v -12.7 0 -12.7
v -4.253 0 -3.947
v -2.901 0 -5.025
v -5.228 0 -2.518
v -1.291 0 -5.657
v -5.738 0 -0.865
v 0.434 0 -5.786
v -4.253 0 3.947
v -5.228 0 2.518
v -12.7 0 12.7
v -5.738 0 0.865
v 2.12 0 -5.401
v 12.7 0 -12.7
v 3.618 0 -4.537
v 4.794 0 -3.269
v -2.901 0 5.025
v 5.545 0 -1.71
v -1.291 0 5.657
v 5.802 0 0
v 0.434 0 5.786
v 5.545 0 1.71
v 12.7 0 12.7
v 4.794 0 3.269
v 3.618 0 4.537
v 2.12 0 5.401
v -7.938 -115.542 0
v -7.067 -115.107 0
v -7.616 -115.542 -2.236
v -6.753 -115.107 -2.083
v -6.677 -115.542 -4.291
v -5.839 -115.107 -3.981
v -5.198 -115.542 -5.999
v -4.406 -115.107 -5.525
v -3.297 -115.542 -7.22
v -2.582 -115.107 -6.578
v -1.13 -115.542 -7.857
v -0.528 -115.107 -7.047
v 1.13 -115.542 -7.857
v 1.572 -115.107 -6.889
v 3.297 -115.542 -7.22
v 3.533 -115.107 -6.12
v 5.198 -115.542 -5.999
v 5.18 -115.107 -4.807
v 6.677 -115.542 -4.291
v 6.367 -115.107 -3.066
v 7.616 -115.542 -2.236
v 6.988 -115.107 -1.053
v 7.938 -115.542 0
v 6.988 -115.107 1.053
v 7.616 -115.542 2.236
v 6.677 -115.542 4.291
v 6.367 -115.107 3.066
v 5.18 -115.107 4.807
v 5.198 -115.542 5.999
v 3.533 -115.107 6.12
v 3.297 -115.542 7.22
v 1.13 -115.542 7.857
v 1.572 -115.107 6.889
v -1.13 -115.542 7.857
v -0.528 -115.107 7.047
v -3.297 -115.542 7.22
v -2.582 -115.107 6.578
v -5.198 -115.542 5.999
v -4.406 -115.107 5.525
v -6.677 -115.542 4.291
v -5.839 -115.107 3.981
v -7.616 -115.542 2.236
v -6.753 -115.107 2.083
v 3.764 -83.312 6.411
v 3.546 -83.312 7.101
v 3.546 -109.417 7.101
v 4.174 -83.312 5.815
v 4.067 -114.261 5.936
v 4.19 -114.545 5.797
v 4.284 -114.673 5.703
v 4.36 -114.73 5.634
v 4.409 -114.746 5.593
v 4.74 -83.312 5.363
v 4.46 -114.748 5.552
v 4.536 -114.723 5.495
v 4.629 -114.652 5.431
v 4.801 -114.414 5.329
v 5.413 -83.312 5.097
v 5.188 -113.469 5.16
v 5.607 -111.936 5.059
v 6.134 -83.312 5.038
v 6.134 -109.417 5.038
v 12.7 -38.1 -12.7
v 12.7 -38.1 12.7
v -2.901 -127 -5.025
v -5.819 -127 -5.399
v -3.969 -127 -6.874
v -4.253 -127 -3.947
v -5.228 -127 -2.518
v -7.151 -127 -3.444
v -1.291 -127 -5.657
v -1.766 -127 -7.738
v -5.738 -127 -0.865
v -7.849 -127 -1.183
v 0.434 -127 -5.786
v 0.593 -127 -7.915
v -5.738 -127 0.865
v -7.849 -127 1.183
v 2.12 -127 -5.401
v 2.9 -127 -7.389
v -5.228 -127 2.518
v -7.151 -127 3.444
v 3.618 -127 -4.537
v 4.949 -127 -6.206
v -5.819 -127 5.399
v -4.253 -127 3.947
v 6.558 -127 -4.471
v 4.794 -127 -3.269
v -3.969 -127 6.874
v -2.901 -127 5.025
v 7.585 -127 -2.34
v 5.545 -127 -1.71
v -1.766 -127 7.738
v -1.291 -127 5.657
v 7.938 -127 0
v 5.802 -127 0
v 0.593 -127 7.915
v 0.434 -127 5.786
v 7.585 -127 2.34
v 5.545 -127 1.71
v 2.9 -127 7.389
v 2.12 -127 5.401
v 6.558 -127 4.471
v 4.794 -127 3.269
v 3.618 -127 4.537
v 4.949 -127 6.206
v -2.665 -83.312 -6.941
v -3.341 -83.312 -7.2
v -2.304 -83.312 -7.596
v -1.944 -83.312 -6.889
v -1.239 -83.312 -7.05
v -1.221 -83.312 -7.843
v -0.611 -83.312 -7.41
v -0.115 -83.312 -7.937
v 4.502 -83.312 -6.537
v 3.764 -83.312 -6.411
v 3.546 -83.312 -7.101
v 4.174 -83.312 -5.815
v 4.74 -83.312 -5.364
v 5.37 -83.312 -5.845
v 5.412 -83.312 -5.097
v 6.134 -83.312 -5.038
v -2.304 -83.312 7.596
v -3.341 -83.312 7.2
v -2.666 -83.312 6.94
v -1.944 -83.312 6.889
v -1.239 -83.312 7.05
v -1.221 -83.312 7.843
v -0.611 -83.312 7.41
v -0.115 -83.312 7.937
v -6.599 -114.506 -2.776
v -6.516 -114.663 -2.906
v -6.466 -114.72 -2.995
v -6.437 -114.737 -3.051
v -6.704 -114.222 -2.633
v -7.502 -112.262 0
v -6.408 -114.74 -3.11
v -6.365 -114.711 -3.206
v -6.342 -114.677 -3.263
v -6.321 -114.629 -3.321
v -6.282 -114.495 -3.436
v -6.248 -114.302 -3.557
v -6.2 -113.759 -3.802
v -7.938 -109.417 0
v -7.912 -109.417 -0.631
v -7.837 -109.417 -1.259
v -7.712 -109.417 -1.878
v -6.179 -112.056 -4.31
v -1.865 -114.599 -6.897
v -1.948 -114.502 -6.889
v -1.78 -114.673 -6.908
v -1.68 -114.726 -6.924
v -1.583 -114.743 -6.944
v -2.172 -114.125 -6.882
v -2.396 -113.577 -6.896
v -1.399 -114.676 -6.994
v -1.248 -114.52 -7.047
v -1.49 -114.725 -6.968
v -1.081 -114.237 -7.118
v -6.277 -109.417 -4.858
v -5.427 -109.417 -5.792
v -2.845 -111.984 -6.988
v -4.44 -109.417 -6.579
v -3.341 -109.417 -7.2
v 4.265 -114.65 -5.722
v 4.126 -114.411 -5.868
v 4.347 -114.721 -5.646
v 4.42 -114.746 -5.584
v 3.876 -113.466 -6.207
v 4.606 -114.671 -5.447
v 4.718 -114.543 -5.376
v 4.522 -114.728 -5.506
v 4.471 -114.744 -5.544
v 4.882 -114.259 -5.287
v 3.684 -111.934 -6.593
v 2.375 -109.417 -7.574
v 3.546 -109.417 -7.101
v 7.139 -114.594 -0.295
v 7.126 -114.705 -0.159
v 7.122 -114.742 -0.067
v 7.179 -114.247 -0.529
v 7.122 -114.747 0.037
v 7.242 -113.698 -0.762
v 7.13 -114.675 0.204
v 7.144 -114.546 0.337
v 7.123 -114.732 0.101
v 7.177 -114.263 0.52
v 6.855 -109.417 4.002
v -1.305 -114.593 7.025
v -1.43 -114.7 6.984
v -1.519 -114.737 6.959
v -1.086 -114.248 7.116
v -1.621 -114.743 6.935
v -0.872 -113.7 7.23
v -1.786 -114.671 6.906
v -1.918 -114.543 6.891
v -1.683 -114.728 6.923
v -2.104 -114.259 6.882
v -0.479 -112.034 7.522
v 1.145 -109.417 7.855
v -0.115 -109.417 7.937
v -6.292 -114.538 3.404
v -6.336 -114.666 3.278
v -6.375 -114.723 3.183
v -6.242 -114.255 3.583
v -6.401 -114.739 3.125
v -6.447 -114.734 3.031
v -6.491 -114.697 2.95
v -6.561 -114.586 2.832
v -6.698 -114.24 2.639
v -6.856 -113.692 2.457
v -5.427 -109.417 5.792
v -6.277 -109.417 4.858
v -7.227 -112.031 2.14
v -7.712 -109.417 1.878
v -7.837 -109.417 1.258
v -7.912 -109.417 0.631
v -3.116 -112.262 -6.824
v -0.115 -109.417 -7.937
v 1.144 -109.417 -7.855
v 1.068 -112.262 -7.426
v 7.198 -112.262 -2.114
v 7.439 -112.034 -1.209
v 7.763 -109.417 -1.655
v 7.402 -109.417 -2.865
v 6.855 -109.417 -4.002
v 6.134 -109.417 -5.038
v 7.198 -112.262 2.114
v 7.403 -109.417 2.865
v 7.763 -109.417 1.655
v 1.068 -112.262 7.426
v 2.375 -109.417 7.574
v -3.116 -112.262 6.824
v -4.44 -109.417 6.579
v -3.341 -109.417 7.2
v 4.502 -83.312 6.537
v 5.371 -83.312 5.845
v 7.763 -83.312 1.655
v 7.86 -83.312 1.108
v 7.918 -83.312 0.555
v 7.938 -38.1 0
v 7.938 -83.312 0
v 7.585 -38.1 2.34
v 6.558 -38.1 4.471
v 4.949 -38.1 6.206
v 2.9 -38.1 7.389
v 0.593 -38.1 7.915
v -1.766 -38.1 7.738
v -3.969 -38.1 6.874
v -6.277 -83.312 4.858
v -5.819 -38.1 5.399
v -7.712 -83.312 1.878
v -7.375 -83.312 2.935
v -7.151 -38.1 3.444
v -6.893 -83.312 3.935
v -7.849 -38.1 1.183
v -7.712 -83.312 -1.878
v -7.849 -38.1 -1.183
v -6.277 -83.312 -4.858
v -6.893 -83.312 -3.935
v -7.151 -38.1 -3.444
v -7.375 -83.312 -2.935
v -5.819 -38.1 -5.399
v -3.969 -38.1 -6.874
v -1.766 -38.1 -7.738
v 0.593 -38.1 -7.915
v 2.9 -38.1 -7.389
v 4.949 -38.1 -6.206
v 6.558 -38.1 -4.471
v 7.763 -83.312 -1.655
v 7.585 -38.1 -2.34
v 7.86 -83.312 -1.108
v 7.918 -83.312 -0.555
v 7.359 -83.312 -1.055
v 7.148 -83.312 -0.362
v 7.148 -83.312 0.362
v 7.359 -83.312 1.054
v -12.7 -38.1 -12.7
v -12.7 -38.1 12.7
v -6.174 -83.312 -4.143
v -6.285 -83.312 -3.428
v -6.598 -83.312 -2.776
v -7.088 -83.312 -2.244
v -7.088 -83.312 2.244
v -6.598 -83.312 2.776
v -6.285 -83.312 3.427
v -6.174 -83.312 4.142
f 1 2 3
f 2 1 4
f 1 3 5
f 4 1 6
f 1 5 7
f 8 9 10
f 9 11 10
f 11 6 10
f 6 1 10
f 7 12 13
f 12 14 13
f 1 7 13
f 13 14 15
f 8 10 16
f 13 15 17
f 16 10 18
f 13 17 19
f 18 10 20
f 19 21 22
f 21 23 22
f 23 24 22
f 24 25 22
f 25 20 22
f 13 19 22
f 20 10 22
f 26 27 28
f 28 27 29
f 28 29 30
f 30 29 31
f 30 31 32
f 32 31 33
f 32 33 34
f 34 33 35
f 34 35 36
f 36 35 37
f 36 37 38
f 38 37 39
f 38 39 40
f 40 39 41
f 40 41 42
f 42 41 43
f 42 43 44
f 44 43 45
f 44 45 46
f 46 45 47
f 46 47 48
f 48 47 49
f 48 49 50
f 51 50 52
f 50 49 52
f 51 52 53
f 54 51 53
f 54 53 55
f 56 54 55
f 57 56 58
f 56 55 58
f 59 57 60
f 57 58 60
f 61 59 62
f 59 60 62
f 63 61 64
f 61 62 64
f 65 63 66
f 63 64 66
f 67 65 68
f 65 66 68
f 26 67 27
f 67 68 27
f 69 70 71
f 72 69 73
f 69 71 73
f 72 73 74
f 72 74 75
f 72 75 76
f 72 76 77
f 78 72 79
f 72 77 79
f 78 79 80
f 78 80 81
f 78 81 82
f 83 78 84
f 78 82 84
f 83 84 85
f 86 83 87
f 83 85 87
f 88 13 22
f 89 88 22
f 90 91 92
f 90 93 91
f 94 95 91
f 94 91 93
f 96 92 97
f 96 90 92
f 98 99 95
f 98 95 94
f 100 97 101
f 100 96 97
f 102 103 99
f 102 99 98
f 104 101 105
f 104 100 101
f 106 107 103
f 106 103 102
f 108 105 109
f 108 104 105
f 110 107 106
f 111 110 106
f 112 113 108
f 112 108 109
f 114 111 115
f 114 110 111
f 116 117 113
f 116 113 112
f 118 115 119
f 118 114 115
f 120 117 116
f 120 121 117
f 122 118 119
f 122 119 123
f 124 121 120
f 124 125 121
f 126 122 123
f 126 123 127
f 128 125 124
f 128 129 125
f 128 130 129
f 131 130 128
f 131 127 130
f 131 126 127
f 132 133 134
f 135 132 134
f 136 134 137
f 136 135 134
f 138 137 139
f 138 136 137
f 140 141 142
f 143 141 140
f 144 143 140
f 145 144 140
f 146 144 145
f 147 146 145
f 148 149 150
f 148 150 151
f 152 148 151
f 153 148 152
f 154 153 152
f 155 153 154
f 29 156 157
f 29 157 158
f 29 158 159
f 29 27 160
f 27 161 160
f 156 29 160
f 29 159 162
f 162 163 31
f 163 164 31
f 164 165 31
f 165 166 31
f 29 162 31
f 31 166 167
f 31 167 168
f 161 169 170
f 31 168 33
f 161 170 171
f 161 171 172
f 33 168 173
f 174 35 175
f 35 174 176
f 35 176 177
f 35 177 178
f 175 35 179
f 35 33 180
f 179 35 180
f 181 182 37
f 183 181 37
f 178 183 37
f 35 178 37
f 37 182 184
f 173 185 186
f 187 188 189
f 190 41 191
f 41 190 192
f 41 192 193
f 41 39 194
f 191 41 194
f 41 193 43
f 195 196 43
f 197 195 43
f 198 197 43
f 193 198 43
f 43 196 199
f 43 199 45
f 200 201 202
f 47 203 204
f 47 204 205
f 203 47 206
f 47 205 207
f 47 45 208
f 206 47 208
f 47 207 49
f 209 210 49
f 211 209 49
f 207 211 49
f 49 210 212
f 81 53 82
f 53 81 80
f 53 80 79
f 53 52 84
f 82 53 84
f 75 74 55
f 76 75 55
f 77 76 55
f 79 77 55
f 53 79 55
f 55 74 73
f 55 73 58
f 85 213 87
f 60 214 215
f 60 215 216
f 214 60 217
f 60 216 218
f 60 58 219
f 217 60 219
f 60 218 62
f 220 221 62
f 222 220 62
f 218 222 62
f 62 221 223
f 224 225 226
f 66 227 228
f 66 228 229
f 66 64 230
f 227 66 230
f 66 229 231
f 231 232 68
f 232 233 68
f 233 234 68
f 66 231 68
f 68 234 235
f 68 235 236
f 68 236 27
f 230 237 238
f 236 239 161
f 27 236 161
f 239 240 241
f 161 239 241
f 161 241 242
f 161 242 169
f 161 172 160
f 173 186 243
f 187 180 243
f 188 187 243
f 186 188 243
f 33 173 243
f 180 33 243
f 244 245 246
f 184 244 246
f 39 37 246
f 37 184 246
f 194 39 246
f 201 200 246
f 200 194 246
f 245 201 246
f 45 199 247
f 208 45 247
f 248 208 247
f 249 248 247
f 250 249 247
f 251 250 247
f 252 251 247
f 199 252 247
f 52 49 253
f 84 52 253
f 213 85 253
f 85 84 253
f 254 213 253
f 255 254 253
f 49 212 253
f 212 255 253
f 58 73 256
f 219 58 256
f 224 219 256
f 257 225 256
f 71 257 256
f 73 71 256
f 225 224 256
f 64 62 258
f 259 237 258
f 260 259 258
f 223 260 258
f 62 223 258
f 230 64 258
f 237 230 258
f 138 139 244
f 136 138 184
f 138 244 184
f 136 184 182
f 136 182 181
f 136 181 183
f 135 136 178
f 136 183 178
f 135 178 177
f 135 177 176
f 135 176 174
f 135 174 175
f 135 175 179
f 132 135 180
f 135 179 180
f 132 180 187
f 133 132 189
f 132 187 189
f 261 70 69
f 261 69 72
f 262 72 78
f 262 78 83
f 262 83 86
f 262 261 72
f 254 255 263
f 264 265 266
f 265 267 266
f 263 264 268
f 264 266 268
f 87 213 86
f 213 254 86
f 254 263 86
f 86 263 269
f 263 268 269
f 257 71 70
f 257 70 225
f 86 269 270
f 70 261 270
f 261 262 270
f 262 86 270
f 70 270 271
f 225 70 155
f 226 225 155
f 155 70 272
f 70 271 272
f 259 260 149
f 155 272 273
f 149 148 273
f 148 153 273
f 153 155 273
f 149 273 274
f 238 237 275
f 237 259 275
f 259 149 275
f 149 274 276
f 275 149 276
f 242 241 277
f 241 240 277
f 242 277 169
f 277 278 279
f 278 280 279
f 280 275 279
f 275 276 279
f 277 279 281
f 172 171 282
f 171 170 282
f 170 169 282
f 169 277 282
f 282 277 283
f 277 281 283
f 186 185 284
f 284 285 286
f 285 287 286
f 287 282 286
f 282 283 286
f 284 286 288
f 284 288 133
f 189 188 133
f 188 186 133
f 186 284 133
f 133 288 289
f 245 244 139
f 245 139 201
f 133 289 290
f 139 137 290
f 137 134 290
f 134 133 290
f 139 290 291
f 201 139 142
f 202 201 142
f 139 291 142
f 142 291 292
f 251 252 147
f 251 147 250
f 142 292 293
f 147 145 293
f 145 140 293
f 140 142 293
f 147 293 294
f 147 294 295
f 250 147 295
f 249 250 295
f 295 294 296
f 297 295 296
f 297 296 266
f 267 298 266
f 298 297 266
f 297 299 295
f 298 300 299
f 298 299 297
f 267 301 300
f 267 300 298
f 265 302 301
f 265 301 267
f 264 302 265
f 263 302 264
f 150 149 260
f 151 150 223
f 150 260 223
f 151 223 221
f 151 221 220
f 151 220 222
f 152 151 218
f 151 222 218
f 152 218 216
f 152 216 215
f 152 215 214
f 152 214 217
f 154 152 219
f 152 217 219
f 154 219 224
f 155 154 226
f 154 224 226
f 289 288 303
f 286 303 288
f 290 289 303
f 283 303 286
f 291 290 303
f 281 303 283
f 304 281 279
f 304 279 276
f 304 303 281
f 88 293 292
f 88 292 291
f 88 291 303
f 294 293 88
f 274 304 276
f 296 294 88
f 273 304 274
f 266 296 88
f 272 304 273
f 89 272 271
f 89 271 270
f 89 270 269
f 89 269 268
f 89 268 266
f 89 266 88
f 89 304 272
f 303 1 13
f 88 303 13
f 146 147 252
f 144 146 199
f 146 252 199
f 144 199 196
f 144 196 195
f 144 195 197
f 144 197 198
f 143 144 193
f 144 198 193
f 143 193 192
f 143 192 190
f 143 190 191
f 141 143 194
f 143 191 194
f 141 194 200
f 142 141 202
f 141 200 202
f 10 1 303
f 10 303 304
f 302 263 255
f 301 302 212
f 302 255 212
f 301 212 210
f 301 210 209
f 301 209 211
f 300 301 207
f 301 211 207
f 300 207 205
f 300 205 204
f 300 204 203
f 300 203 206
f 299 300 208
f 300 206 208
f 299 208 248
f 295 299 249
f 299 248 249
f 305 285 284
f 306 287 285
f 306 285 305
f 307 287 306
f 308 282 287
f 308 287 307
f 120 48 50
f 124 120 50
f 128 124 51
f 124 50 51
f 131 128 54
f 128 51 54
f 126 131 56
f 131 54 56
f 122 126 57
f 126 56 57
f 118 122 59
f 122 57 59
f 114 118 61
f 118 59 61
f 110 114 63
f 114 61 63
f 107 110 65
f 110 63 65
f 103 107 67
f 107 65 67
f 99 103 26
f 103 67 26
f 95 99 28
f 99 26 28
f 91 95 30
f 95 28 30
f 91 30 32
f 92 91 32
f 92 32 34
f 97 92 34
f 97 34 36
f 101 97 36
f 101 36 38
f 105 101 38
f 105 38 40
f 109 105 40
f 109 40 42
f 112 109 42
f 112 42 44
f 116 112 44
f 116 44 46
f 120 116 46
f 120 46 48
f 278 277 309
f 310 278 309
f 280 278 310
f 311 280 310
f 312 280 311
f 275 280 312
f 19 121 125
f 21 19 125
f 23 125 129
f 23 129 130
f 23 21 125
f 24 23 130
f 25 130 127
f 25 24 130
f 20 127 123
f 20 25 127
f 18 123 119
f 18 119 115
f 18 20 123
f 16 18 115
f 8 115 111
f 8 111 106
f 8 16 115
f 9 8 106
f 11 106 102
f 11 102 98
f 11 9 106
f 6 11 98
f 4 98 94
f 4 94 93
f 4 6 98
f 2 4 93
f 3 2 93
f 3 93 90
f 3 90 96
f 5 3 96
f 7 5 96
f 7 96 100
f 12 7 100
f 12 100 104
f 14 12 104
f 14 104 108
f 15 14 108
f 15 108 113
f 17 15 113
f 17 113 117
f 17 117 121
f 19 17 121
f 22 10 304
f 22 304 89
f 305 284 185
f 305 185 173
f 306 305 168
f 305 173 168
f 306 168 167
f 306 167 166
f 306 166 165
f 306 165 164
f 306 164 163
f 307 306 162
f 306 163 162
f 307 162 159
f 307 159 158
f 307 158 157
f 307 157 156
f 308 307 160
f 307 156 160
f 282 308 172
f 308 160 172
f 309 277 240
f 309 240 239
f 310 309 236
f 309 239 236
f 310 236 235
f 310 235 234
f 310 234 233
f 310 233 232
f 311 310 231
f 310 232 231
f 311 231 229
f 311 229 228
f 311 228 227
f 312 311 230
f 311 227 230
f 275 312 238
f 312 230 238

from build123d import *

# Parameters (mm, degrees)
F0_W     = 25.4
F0_H     = 25.4
F0_R     = 7.9375
F0_R_2   = 5.8024107256
F1_DEPTH = 38.1
F2_DEPTH = 127
F6_START = -12.192
F5_R     = 2.4554456834
F6_DEPTH = 31.496


with BuildPart() as f1:
    # F0 (on Front) → F1 (new body)
    with BuildSketch(Plane.XZ):
        Rectangle(F0_W, F0_H)
        Circle(F0_R, mode=Mode.SUBTRACT)
        Circle(F0_R)
        Circle(F0_R_2, mode=Mode.SUBTRACT)
    extrude(amount=F1_DEPTH)

    # F0 (on Front) → F2 (join)
    with BuildSketch(Plane.XZ):
        Circle(F0_R)
        Circle(F0_R_2, mode=Mode.SUBTRACT)
    extrude(amount=F2_DEPTH)

    # F3 (on Top) → F4 (revolve, cut)
    with BuildSketch(Plane.XY):
        Polygon((-8.0296611413, -108.8151410222), (-8.0938637257, -115.6206354499), (-7.0666195825, -115.1070147753), align=None)
    revolve(axis=Axis((0, 0, 0), (0, -1, 0)), mode=Mode.SUBTRACT)

    # F5 (on face) → F6 (cut)
    with BuildSketch(Plane.XZ.offset(127).offset(F6_START)):
        with Locations((9.5767229945, -0.0002272034)):
            Circle(F5_R)
        with Locations((5.9707205281, 7.487714074)):
            Circle(F5_R)
        with Locations((-2.1318934647, 9.3370828434)):
            Circle(F5_R)
        with Locations((-8.6296853842, 4.1552667011)):
            Circle(F5_R)
        with Locations((-8.6296853842, -4.155721108)):
            Circle(F5_R)
        with Locations((-2.1318934647, -9.3375372503)):
            Circle(F5_R)
        with Locations((5.9707205281, -7.4881684809)):
            Circle(F5_R)
    extrude(amount=-F6_DEPTH, mode=Mode.SUBTRACT)


solid = f1.part
